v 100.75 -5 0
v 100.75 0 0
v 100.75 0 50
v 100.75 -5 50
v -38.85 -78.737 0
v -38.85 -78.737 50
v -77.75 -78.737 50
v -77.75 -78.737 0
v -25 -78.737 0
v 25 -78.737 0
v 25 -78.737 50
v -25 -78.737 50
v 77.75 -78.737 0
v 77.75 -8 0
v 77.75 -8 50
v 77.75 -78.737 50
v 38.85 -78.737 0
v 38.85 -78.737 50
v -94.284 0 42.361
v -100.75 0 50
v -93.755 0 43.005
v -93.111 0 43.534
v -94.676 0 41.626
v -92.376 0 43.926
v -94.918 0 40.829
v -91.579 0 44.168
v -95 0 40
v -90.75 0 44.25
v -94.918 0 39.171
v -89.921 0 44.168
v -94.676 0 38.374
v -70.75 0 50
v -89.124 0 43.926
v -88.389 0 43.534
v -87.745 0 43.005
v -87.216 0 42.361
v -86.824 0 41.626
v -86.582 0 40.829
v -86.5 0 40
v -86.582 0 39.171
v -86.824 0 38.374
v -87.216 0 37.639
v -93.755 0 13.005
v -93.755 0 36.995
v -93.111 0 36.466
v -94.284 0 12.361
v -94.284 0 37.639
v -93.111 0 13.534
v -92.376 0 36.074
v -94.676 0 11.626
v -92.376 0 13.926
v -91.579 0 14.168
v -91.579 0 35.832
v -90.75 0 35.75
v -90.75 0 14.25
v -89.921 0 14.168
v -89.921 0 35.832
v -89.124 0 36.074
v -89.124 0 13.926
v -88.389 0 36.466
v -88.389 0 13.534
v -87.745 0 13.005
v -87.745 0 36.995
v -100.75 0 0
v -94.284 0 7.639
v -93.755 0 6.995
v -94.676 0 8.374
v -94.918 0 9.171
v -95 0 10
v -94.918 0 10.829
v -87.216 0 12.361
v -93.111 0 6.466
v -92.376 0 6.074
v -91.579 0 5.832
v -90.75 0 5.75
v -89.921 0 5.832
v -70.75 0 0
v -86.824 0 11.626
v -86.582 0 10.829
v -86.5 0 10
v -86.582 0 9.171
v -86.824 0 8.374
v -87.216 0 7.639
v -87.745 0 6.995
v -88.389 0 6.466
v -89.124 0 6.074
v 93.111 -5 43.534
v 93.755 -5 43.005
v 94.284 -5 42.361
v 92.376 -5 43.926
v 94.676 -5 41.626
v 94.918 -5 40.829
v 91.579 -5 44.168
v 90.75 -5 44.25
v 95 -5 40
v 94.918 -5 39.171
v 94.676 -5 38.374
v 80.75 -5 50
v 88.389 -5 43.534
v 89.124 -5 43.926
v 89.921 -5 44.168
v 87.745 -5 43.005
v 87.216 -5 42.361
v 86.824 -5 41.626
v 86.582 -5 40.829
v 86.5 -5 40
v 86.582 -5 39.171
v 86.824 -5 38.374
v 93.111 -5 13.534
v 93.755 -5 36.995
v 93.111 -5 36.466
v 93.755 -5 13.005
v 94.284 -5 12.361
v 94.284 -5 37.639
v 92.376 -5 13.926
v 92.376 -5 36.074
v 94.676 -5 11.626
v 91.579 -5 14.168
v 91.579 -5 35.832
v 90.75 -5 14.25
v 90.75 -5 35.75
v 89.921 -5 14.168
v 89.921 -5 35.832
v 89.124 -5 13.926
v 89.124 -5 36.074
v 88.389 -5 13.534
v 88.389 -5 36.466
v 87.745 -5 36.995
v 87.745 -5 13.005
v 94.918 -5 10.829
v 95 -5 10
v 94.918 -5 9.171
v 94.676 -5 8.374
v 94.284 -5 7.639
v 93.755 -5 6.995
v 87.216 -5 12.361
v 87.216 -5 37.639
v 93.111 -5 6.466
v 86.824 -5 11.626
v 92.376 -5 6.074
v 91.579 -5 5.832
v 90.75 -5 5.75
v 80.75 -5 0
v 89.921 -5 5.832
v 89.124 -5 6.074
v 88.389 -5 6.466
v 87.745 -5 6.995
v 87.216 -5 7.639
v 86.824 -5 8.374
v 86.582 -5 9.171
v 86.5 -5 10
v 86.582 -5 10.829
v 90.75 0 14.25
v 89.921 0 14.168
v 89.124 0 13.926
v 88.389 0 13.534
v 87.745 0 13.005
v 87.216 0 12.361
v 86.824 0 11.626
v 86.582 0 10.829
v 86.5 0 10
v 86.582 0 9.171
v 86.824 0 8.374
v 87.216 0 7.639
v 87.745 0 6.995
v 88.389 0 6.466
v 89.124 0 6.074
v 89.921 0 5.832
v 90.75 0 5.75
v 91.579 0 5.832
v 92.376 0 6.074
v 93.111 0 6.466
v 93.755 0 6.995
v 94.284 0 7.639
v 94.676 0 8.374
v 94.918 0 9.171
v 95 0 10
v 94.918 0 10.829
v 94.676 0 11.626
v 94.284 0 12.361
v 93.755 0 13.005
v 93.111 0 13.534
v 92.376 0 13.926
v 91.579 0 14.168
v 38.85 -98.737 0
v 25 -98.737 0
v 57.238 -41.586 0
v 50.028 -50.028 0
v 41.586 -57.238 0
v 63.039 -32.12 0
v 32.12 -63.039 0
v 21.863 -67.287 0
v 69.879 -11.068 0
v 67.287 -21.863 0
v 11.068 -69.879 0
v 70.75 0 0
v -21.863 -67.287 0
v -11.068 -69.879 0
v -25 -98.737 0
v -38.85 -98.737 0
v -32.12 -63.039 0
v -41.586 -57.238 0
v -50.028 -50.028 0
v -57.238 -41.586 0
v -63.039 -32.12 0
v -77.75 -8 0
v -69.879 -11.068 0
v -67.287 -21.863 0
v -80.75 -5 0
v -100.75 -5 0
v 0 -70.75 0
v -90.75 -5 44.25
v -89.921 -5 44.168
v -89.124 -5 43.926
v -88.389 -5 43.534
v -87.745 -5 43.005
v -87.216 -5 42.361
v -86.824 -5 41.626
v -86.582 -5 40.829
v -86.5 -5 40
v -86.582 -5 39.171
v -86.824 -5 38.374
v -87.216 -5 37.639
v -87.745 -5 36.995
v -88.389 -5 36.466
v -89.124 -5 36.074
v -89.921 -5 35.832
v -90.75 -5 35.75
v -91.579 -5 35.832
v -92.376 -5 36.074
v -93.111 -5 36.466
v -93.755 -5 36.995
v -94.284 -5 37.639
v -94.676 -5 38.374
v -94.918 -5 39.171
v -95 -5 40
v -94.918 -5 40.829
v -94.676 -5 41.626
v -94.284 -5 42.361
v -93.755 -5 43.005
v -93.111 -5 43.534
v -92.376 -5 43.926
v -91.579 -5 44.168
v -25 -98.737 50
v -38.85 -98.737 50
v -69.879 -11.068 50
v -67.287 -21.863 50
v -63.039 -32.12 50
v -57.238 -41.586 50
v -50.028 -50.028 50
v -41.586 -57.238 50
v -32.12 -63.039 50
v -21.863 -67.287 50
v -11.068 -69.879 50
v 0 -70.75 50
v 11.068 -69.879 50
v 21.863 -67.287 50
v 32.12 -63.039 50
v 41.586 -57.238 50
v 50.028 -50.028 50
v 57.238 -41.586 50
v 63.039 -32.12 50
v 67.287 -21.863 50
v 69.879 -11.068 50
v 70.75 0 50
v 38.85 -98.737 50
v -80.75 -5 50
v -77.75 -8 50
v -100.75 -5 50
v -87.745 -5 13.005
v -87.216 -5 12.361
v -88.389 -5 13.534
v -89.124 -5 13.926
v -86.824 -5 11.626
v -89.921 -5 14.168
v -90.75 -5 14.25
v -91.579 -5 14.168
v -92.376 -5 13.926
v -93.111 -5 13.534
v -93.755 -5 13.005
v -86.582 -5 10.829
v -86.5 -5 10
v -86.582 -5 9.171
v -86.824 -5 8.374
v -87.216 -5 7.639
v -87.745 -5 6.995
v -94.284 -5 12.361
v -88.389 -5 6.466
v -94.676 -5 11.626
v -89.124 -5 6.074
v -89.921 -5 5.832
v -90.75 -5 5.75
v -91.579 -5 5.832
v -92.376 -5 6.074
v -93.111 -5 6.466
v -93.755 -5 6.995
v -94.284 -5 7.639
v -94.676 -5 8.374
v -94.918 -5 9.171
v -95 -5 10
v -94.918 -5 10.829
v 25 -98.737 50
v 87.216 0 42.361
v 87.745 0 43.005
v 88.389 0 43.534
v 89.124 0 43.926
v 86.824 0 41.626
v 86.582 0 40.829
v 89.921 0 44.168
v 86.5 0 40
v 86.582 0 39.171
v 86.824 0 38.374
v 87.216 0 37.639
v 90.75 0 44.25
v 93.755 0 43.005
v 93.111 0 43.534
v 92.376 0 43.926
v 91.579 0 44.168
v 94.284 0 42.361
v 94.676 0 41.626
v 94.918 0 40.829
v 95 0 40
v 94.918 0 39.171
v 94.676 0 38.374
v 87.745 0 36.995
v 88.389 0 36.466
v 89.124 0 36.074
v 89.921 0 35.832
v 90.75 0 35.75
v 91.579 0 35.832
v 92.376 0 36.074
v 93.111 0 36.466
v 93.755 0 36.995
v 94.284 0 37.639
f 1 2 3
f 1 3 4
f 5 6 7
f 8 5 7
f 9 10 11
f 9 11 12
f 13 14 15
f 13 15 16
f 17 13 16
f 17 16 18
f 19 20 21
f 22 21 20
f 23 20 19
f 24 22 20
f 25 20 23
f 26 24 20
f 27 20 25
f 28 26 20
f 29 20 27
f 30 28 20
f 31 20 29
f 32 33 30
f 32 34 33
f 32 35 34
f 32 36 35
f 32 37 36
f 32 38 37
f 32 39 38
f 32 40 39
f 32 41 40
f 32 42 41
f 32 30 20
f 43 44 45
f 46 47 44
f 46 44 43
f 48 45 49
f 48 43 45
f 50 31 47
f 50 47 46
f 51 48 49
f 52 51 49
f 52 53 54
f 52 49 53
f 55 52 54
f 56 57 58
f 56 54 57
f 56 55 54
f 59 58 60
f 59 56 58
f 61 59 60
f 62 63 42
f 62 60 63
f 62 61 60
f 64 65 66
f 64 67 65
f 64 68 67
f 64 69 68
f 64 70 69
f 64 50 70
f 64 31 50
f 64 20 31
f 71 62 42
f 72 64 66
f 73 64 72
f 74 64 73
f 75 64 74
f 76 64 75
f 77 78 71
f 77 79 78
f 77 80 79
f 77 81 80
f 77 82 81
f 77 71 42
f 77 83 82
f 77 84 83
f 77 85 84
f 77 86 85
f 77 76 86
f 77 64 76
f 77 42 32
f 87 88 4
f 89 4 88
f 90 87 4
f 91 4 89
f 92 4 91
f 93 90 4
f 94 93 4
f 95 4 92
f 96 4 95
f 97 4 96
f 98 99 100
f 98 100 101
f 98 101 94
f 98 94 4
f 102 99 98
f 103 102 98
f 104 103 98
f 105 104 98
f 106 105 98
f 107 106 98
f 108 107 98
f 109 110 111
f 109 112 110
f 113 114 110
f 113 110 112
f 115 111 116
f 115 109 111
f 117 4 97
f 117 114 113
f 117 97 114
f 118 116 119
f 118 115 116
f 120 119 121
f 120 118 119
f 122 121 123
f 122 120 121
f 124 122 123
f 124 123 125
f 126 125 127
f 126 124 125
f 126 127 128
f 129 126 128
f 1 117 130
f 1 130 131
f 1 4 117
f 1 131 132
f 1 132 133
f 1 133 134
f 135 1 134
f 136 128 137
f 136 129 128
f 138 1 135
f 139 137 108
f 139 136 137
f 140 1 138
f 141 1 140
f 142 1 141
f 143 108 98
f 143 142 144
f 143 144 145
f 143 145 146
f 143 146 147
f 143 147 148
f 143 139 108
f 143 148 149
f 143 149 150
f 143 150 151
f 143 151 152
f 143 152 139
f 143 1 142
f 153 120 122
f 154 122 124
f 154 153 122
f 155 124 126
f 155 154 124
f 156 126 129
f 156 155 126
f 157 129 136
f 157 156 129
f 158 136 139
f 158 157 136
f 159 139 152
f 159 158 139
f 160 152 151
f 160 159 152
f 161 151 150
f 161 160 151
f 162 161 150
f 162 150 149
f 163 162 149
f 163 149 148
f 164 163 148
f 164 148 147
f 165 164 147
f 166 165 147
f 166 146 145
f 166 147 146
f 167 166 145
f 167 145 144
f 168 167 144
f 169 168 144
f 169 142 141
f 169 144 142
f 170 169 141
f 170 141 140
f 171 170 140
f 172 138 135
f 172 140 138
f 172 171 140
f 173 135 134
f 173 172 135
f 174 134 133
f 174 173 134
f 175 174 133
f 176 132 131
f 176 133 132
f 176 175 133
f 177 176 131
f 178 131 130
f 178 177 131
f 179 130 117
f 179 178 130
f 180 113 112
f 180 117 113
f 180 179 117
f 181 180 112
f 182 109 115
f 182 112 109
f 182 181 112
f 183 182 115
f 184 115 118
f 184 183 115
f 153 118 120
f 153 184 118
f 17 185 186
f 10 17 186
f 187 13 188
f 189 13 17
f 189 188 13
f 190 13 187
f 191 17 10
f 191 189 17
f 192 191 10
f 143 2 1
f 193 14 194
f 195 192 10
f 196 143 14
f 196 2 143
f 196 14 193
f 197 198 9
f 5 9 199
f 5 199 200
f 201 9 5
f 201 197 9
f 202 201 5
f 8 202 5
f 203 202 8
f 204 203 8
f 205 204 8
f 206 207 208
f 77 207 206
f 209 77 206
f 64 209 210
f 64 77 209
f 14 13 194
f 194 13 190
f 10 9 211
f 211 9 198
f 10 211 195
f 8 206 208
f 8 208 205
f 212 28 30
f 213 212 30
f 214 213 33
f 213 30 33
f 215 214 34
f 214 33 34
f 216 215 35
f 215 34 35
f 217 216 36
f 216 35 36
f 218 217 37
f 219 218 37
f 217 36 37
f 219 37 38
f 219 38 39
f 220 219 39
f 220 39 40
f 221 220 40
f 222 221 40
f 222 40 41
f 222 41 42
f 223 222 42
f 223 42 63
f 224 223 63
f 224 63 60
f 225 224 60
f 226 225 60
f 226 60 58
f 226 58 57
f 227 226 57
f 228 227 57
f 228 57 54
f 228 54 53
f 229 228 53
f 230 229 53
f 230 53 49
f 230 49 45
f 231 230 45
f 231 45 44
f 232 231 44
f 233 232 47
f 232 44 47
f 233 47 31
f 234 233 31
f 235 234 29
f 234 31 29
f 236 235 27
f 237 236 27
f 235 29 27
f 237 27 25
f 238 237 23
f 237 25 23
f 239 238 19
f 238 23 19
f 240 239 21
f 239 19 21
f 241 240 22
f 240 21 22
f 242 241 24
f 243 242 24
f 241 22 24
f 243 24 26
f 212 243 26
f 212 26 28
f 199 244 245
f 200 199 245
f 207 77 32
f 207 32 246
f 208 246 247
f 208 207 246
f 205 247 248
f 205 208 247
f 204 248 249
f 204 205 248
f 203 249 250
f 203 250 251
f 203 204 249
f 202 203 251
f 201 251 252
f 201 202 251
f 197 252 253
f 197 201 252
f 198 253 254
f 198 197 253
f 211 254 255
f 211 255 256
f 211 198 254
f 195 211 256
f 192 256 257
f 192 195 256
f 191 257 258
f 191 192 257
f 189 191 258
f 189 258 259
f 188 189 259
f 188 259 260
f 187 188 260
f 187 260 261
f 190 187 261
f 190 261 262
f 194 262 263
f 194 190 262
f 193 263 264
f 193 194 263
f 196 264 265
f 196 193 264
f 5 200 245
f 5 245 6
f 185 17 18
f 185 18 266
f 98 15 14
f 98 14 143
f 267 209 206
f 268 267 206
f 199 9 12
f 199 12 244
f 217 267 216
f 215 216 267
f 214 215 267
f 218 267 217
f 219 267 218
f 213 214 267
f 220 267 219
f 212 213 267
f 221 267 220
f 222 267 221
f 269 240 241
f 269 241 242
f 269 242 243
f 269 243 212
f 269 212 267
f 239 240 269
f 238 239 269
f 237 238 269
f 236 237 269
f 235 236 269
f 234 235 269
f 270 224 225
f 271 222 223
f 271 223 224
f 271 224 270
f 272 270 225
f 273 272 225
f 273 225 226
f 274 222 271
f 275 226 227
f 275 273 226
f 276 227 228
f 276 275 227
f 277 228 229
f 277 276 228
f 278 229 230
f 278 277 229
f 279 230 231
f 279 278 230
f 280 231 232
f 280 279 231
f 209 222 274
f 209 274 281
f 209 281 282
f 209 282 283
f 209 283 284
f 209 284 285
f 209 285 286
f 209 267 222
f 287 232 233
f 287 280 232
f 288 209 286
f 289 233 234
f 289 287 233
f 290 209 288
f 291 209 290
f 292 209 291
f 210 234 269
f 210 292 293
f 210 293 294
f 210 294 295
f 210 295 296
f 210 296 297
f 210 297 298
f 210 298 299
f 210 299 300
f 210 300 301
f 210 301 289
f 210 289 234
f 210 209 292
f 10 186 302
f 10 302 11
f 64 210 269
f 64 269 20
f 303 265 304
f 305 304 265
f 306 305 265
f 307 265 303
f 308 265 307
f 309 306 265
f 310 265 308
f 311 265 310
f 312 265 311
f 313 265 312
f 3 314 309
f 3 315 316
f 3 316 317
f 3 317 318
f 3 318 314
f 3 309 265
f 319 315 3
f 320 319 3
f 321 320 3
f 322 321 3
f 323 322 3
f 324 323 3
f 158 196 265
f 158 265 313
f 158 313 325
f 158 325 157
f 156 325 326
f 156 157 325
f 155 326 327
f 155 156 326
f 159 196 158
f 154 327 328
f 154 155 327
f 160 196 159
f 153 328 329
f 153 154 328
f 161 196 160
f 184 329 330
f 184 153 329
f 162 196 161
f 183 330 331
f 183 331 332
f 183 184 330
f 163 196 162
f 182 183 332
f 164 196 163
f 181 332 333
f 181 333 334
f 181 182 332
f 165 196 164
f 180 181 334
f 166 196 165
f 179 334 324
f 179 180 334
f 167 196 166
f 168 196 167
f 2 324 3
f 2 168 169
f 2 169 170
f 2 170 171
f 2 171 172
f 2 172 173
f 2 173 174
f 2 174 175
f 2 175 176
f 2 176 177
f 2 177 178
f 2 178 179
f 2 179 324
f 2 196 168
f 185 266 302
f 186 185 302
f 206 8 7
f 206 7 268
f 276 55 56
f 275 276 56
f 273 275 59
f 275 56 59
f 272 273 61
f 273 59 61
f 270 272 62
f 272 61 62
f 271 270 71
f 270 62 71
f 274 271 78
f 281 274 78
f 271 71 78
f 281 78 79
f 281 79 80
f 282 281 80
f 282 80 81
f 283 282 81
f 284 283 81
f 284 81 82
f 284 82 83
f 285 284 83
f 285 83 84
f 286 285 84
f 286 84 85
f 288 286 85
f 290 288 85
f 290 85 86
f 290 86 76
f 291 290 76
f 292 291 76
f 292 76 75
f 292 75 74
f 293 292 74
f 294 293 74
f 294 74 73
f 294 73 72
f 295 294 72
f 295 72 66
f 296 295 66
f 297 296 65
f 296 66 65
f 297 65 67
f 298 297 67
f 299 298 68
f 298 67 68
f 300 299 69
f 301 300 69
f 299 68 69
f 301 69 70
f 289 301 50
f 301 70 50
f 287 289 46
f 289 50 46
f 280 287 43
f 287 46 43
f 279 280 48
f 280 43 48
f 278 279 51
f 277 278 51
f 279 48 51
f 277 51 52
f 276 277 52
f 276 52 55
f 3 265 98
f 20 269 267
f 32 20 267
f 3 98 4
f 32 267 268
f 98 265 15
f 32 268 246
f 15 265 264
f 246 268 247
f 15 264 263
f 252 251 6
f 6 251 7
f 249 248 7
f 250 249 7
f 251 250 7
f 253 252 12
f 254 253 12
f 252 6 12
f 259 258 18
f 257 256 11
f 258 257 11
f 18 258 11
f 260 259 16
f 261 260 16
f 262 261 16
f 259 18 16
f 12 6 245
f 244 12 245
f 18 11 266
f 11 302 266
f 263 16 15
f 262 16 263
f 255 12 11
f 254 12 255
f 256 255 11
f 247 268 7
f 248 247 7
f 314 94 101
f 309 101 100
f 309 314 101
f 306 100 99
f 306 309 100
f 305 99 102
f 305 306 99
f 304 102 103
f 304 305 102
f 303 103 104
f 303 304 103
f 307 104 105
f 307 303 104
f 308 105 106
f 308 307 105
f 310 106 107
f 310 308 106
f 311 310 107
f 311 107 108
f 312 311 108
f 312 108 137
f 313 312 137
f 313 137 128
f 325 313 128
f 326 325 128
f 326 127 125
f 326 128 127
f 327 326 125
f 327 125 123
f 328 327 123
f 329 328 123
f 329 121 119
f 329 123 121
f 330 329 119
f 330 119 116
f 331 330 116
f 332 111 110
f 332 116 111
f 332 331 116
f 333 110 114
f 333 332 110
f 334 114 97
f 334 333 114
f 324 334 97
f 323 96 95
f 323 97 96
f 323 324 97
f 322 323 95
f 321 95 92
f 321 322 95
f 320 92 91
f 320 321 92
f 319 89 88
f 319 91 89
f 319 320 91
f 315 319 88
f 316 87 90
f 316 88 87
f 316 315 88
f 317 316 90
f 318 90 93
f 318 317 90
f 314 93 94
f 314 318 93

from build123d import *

# Parameters (mm, degrees)
DODANIE_WYCI_GNI_CIE1_DEPTH = 50
SZKIC2_R                    = 4.25
WYTNIJ_WYCI_GNI_CIE1_DEPTH  = 21
SFAZOWANIE1_SIZE            = 3
SFAZOWANIE2_SIZE            = 3


with BuildPart() as part:
    # Szkic1 → Dodanie-wyciągnięcie1 (new body)
    with BuildSketch(Plane.XY):
        with BuildLine():
            Line((70.75, 0), (100.75, 0))
            Line((100.75, 0), (100.75, -5))
            Line((100.75, -5), (77.75, -5))
            Line((77.75, -5), (77.75, -78.737292332))
            Line((77.75, -78.737292332), (38.85, -78.737292332))
            Line((38.85, -78.737292332), (38.85, -98.737292332))
            Line((38.85, -98.737292332), (25, -98.737292332))
            Line((25, -98.737292332), (25, -78.737292332))
            Line((25, -78.737292332), (-25, -78.737292332))
            Line((-25, -78.737292332), (-25, -98.737292332))
            Line((-25, -98.737292332), (-38.85, -98.737292332))
            Line((-38.85, -98.737292332), (-38.85, -78.737292332))
            Line((-38.85, -78.737292332), (-77.75, -78.737292332))
            Line((-77.75, -78.737292332), (-77.75, -5))
            Line((-77.75, -5), (-100.75, -5))
            Line((-100.75, -5), (-100.75, 0))
            Line((-100.75, 0), (-70.75, 0))
            ThreePointArc((-70.75, 0), (0, -70.75), (70.75, 0))
        make_face()
    extrude(amount=DODANIE_WYCI_GNI_CIE1_DEPTH)

    # Szkic2 → Wytnij-wyciągnięcie1 (cut)
    with BuildSketch(Plane(origin=(0, 0, 0), x_dir=(1, 0, 0), z_dir=(0, 1, 0))):
        with Locations((-90.75, -10)):
            Circle(SZKIC2_R)
        with Locations((-90.75, -40)):
            Circle(SZKIC2_R)
    wytnij_wyci_gni_cie1 = extrude(amount=-WYTNIJ_WYCI_GNI_CIE1_DEPTH, mode=Mode.SUBTRACT)

    # Lustro2: Wytnij-wyciągnięcie1 across plane
    add(wytnij_wyci_gni_cie1.mirror(Plane(origin=(0, 0, 0), x_dir=(0, 0, 1), z_dir=(1, 0, 0))), mode=Mode.SUBTRACT)

    # Sfazowanie1
    sfazowanie1_edges = [part.edges().sort_by_distance(p)[0] for p in [
        (-77.75, -5, 25),
    ]]
    chamfer(sfazowanie1_edges, length=SFAZOWANIE1_SIZE)

    # Sfazowanie2
    sfazowanie2_edges = [part.edges().sort_by_distance(p)[0] for p in [
        (77.75, -5, 25),
    ]]
    chamfer(sfazowanie2_edges, length=SFAZOWANIE2_SIZE)


solid = part.part
